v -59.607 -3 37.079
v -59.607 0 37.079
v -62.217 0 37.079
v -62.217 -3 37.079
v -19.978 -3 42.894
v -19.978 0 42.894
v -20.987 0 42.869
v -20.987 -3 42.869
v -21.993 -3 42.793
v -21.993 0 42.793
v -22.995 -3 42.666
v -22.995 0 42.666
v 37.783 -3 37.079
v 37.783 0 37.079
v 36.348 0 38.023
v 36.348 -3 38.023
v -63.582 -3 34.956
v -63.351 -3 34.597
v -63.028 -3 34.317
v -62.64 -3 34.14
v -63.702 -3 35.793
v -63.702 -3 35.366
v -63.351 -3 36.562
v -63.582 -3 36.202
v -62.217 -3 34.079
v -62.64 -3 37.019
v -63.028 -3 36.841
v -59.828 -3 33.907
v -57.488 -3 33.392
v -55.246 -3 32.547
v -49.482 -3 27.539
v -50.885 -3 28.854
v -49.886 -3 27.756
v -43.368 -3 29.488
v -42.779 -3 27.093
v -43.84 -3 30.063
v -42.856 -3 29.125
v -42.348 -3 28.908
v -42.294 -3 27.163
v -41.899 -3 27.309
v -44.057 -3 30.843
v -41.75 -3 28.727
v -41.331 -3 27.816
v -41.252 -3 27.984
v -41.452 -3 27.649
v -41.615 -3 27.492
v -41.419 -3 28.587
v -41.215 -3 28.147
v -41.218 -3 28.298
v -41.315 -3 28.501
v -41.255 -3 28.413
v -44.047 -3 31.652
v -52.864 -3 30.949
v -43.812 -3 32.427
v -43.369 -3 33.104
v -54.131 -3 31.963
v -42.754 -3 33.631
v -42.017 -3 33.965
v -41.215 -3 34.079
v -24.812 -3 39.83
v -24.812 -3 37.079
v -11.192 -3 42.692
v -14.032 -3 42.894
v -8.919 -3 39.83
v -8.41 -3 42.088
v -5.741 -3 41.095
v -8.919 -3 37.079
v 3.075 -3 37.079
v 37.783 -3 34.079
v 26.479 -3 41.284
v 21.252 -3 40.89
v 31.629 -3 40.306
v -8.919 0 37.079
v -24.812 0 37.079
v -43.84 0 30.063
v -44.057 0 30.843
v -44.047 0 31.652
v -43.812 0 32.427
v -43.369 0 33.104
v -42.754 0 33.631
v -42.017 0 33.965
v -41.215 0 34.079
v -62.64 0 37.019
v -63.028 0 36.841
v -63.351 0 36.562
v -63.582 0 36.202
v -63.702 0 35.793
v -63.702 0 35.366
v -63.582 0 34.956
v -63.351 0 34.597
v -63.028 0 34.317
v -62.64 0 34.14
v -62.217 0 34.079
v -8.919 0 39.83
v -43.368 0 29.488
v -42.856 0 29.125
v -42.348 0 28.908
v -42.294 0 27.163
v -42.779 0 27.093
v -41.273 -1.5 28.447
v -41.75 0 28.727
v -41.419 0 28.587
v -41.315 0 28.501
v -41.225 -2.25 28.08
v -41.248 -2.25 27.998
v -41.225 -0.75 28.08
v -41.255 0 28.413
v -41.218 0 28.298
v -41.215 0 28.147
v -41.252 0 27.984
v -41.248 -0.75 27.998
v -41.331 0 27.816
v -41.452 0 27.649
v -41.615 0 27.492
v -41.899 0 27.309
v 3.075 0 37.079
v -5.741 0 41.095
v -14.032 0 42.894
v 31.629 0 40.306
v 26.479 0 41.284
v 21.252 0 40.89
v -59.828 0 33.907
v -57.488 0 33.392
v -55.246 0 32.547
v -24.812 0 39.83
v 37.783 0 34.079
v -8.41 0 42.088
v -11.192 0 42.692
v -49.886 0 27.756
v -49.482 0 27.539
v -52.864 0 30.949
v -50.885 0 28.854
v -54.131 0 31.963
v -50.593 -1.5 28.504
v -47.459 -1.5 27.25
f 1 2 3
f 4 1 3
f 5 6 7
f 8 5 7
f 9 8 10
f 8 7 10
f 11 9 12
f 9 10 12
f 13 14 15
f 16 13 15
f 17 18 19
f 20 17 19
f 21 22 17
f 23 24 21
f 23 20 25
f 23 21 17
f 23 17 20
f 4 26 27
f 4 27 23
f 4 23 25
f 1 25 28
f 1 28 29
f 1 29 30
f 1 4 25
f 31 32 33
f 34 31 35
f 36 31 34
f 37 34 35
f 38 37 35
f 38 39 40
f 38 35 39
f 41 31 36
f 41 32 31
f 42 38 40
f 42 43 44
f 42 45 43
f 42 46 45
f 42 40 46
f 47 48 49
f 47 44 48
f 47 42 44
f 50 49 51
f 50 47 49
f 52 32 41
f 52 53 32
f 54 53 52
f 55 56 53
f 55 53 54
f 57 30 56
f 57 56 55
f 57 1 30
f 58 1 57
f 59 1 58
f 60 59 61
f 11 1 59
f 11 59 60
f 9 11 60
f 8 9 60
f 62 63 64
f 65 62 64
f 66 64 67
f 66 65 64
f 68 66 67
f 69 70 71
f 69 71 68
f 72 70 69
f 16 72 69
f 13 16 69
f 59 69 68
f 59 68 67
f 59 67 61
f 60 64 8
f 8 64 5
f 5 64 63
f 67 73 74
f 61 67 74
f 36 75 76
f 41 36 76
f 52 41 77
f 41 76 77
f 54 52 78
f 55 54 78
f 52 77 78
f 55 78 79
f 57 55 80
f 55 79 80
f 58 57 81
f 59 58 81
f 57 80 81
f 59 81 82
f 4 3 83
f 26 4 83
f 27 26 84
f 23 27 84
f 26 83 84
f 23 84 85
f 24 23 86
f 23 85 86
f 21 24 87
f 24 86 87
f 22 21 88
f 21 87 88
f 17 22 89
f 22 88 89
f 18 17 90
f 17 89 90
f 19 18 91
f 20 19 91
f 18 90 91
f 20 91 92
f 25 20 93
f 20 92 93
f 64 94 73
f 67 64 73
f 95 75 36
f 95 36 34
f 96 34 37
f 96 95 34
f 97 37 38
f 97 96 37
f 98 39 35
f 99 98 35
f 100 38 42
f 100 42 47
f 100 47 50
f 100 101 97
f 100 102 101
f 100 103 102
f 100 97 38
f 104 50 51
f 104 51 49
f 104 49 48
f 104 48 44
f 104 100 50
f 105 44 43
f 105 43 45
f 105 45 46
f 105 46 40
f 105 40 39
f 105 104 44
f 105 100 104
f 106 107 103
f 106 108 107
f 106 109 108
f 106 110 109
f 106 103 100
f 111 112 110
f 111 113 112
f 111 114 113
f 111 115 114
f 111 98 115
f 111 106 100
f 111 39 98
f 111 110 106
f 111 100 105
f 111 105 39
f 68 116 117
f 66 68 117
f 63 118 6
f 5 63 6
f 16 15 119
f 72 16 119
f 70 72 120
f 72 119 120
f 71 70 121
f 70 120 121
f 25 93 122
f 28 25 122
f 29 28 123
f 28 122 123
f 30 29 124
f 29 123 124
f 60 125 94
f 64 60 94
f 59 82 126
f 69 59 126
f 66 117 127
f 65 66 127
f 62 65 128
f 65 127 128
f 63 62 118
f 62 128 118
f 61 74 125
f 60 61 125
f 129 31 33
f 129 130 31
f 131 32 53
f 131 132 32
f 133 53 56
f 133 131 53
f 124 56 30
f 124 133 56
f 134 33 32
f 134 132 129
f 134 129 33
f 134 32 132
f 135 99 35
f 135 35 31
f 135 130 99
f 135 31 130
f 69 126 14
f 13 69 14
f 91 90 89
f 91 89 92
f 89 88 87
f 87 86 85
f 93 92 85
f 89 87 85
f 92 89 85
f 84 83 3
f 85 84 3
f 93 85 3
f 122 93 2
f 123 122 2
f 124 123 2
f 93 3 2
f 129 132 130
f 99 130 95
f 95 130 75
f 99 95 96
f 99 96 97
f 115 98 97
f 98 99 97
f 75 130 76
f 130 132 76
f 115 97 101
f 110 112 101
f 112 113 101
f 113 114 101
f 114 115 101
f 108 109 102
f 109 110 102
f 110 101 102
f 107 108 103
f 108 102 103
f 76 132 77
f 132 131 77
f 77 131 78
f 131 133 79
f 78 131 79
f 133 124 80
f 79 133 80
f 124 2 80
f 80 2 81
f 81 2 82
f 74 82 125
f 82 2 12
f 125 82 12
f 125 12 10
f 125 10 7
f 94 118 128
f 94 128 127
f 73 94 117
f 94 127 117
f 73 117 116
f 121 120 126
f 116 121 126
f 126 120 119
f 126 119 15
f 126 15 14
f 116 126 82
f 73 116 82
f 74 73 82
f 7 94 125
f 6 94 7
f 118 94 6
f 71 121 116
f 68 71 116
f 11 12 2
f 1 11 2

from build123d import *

# Parameters (mm, degrees)
F1_DEPTH = 3


with BuildPart() as f1:
    # F0 (on Front) → F1 (new body)
    with BuildSketch(Plane.XZ):
        with BuildLine():
            Line((-62.2174302257, 34.0792866244), (-62.2174302257, 37.0792866244))
            ThreePointArc((-62.2174302257, 37.0792866244), (-63.7174302257, 35.5792866244), (-62.2174302257, 34.0792866244))
        make_face()
        with BuildLine():
            ThreePointArc((-43.8397750258, 30.0628747791), (-43.6141613241, 32.781176986), (-41.2152074277, 34.0792866244))
            Line((-41.2152074277, 34.0792866244), (-41.2691645324, 34.0792866244))
            Line((-41.2691645324, 34.0792866244), (-54.0572144091, 34.0792866244))
            Line((-54.0572144091, 34.0792866244), (-62.2174302257, 34.0792866244))
            ThreePointArc((-62.2174302257, 34.0792866244), (-58.6487465395, 33.6917698382), (-55.2464202046, 32.5472839177))
            add(Edge.make_bspline(
                [(-42.7791178226, 27.0931944251), (-49.7212063405, 27.3062232623), (-49.3171741888, 27.0847515739), (-53.5192862103, 31.93581339), (-55.2464202046, 32.5472839177)],
                knots=[0, 0, 0, 0, 0.5316142491, 1, 1, 1, 1], degree=3))
            add(Edge.make_bspline(
                [(-43.8397750258, 30.0628747791), (-42.9603002793, 28.648200624), (-40.4412665904, 29.1570281848), (-41.5067049695, 27.1511407727), (-42.7791178226, 27.0931944251)],
                knots=[0, 0, 0, 0, 0.5503485868, 1, 1, 1, 1], degree=3))
        make_face()
        with BuildLine():
            Line((-8.9188218117, 37.0792866244), (3.0751132872, 37.0792866244))
            Line((3.0751132872, 37.0792866244), (-5.7411652831, 41.0951580407))
            ThreePointArc((-5.7411652831, 41.0951580407), (-9.7899424344, 42.4394313305), (-14.0317167887, 42.894423008))
            Line((-14.0317167887, 42.894423008), (-19.9778148896, 42.894423008))
            ThreePointArc((-19.9778148896, 42.894423008), (-21.4905036729, 42.837135277), (-22.9945266053, 42.6656002725))
            Line((-22.9945266053, 42.6656002725), (-59.6065756835, 37.0792866244))
            Line((-59.6065756835, 37.0792866244), (-24.8117092997, 37.0792866244))
            Line((-24.8117092997, 37.0792866244), (-24.8117092997, 39.829544723))
            Line((-24.8117092997, 39.829544723), (-8.9188218117, 39.829544723))
            Line((-8.9188218117, 39.829544723), (-8.9188218117, 37.0792866244))
        make_face()
        Polygon((37.7825697743, 34.0792866244), (37.7825697743, 37.0792866244), (3.0751132872, 37.0792866244), (-8.9188218117, 37.0792866244), (-24.8117092997, 37.0792866244), (-59.6065756835, 37.0792866244), (-62.2174302257, 37.0792866244), (-62.2174302257, 34.0792866244), (-54.0572144091, 34.0792866244), (-41.2691645324, 34.0792866244), (-41.2152074277, 34.0792866244), align=None)
        with BuildLine():
            Line((3.0751132872, 37.0792866244), (37.7825697743, 37.0792866244))
            Line((37.7825697743, 37.0792866244), (36.3480403802, 38.0231242511))
            ThreePointArc((36.3480403802, 38.0231242511), (29.0861642169, 40.964055469), (21.251728148, 40.889669157))
            Line((21.251728148, 40.889669157), (3.0751132872, 37.0792866244))
        make_face()
    extrude(amount=F1_DEPTH)


solid = f1.part
